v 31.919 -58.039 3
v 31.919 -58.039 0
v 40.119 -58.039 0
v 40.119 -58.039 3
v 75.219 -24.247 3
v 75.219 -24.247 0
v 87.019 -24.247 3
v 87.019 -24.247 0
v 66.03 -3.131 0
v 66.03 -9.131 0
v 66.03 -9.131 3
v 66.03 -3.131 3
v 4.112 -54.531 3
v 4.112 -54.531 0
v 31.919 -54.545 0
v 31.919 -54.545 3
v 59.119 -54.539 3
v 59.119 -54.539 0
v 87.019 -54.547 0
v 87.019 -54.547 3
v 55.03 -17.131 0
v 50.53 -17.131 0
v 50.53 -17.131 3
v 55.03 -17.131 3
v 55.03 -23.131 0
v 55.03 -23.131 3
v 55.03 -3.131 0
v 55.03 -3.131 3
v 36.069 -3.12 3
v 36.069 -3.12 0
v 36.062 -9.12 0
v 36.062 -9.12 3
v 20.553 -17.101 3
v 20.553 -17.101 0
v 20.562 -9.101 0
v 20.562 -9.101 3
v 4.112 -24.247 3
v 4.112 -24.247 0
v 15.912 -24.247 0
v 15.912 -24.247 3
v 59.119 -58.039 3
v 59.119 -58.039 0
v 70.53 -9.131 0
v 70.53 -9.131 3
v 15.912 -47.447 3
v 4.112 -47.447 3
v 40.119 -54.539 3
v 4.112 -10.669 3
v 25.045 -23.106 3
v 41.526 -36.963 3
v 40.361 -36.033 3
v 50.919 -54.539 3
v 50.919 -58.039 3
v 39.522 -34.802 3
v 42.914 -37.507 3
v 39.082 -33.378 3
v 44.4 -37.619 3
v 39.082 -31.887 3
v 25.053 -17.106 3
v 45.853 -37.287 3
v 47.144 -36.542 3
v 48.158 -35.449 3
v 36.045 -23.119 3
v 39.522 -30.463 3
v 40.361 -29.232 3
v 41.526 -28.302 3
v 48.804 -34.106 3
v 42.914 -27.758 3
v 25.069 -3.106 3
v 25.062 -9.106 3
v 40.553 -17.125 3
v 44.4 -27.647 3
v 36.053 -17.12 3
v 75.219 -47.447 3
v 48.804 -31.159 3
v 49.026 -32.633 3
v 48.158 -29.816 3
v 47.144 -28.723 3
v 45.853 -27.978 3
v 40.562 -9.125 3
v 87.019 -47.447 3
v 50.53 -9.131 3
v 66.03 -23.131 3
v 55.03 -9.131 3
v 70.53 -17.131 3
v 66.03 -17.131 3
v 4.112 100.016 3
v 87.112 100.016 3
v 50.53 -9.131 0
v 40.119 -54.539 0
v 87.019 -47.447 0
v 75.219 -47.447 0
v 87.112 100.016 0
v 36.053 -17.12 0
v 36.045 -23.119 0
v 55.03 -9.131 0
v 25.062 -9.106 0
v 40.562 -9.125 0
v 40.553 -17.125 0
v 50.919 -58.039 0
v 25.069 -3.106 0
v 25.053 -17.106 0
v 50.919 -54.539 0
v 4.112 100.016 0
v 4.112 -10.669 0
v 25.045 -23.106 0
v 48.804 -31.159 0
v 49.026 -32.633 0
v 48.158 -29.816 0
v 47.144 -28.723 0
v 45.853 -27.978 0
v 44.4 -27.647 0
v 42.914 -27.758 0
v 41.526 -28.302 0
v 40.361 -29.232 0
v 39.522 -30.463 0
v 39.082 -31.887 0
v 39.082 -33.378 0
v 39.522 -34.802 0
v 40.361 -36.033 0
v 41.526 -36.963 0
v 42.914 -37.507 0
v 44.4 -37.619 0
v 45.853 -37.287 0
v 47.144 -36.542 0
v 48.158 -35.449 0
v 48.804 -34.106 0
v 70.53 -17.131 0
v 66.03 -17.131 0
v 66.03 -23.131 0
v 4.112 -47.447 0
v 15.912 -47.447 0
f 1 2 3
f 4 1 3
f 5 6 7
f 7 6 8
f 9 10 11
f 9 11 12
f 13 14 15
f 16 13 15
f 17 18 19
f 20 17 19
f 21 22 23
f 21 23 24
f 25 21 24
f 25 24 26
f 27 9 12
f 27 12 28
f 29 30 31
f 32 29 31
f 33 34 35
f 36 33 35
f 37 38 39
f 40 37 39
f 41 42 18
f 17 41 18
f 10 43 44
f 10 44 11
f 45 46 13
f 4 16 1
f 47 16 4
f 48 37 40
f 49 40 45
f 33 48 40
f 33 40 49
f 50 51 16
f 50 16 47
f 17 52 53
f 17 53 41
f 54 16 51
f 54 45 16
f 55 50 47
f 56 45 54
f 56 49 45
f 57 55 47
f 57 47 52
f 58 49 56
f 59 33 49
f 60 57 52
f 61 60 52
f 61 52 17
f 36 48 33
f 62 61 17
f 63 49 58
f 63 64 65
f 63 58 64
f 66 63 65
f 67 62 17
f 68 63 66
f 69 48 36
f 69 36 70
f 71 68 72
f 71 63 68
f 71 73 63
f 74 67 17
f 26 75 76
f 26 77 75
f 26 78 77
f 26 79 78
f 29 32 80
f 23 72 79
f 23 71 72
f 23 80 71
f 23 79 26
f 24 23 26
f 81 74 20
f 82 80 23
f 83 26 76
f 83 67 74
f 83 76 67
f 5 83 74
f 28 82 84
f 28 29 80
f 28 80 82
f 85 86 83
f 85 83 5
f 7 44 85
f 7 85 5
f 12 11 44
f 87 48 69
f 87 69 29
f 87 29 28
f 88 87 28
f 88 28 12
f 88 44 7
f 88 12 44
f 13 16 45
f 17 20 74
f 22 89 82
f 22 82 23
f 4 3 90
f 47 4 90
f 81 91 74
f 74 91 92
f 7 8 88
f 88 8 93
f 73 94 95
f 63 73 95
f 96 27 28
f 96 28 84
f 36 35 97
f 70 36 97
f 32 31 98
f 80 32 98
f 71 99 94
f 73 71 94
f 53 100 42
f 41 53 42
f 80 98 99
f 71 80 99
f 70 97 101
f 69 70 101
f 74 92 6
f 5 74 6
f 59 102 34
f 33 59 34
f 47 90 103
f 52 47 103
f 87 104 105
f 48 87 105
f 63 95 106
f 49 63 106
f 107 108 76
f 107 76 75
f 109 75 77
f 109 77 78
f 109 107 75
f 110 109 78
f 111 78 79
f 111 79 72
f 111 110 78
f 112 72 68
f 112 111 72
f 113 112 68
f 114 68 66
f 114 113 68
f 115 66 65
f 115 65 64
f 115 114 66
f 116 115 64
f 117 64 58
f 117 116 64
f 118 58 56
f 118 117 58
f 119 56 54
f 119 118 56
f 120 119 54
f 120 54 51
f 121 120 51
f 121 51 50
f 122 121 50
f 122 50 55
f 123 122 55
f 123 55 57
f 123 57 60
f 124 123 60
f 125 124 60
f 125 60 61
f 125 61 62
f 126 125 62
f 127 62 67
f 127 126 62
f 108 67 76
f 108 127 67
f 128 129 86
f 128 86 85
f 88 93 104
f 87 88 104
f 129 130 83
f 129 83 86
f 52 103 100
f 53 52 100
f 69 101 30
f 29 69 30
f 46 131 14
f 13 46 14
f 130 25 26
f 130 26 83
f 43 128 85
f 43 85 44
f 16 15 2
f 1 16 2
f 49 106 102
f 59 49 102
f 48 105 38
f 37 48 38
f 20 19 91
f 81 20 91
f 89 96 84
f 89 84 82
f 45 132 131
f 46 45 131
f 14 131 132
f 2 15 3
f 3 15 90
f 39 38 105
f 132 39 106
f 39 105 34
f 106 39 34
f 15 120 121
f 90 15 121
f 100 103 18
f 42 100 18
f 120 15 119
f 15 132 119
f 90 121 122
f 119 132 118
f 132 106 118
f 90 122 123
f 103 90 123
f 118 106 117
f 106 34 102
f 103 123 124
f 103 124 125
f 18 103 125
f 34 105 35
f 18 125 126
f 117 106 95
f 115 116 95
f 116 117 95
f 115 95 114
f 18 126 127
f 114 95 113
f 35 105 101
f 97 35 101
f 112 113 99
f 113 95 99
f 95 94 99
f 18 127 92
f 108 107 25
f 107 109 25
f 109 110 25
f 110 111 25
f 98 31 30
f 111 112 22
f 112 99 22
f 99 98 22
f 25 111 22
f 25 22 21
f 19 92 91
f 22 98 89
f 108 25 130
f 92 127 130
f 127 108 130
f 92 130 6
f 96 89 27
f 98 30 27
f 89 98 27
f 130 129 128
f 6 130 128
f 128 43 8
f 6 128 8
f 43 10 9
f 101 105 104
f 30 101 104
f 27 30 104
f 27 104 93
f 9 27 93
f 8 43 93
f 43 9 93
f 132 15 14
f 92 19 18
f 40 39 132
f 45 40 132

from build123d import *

# Parameters (mm, degrees)
MODEL_R                 = 5
SALIENTE_EXTRUIR1_DEPTH = 3


with BuildPart() as part:
    # Model → Saliente-Extruir1 (new body)
    with BuildSketch(Plane.XY):
        Polygon((4.111589817, 100.015674998), (4.111565333, -10.669034302), (4.111569102, -24.246637901), (15.911569751, -24.246637901), (15.911569751, -47.446638901), (4.111568751, -47.446638901), (4.111568751, -54.531377488), (31.918927332, -54.54545045), (31.918927332, -58.038983798), (40.118927332, -58.038983798), (40.118927332, -54.538983798), (50.918927332, -54.538983798), (50.918927332, -58.038983798), (59.118927332, -58.038983798), (59.118927332, -54.538983798), (87.018940879, -54.546637), (87.018940879, -47.446639), (75.218940879, -47.446639), (75.218940879, -24.246638), (87.018940879, -24.246638), (87.111592427, 100.015659295), align=None)
        with Locations((44.026491998, -32.632550575)):
            Circle(MODEL_R, mode=Mode.SUBTRACT)
        Polygon((25.045319697, -23.106306752), (25.052514337, -17.106311065), (20.552517572, -17.100915085), (20.562110425, -9.100920836), (25.06210719, -9.106316817), (25.06930183, -3.10632113), (36.069293922, -3.119511304), (36.062099282, -9.11950699), (40.562096047, -9.12490297), (40.552503193, -17.124897219), (36.052506429, -17.119501239), (36.045311789, -23.119496925), align=None, mode=Mode.SUBTRACT)
        Polygon((66.030211381, -23.130879389), (66.030211381, -17.130879389), (70.530211381, -17.130879389), (70.530211381, -9.130879389), (66.030211381, -9.130879389), (66.030211381, -3.130879389), (55.030211381, -3.130879389), (55.030211381, -9.130879389), (50.530211381, -9.130879389), (50.530211381, -17.130879389), (55.030211381, -17.130879389), (55.030211381, -23.130879389), align=None, mode=Mode.SUBTRACT)
    extrude(amount=SALIENTE_EXTRUIR1_DEPTH)


solid = part.part
